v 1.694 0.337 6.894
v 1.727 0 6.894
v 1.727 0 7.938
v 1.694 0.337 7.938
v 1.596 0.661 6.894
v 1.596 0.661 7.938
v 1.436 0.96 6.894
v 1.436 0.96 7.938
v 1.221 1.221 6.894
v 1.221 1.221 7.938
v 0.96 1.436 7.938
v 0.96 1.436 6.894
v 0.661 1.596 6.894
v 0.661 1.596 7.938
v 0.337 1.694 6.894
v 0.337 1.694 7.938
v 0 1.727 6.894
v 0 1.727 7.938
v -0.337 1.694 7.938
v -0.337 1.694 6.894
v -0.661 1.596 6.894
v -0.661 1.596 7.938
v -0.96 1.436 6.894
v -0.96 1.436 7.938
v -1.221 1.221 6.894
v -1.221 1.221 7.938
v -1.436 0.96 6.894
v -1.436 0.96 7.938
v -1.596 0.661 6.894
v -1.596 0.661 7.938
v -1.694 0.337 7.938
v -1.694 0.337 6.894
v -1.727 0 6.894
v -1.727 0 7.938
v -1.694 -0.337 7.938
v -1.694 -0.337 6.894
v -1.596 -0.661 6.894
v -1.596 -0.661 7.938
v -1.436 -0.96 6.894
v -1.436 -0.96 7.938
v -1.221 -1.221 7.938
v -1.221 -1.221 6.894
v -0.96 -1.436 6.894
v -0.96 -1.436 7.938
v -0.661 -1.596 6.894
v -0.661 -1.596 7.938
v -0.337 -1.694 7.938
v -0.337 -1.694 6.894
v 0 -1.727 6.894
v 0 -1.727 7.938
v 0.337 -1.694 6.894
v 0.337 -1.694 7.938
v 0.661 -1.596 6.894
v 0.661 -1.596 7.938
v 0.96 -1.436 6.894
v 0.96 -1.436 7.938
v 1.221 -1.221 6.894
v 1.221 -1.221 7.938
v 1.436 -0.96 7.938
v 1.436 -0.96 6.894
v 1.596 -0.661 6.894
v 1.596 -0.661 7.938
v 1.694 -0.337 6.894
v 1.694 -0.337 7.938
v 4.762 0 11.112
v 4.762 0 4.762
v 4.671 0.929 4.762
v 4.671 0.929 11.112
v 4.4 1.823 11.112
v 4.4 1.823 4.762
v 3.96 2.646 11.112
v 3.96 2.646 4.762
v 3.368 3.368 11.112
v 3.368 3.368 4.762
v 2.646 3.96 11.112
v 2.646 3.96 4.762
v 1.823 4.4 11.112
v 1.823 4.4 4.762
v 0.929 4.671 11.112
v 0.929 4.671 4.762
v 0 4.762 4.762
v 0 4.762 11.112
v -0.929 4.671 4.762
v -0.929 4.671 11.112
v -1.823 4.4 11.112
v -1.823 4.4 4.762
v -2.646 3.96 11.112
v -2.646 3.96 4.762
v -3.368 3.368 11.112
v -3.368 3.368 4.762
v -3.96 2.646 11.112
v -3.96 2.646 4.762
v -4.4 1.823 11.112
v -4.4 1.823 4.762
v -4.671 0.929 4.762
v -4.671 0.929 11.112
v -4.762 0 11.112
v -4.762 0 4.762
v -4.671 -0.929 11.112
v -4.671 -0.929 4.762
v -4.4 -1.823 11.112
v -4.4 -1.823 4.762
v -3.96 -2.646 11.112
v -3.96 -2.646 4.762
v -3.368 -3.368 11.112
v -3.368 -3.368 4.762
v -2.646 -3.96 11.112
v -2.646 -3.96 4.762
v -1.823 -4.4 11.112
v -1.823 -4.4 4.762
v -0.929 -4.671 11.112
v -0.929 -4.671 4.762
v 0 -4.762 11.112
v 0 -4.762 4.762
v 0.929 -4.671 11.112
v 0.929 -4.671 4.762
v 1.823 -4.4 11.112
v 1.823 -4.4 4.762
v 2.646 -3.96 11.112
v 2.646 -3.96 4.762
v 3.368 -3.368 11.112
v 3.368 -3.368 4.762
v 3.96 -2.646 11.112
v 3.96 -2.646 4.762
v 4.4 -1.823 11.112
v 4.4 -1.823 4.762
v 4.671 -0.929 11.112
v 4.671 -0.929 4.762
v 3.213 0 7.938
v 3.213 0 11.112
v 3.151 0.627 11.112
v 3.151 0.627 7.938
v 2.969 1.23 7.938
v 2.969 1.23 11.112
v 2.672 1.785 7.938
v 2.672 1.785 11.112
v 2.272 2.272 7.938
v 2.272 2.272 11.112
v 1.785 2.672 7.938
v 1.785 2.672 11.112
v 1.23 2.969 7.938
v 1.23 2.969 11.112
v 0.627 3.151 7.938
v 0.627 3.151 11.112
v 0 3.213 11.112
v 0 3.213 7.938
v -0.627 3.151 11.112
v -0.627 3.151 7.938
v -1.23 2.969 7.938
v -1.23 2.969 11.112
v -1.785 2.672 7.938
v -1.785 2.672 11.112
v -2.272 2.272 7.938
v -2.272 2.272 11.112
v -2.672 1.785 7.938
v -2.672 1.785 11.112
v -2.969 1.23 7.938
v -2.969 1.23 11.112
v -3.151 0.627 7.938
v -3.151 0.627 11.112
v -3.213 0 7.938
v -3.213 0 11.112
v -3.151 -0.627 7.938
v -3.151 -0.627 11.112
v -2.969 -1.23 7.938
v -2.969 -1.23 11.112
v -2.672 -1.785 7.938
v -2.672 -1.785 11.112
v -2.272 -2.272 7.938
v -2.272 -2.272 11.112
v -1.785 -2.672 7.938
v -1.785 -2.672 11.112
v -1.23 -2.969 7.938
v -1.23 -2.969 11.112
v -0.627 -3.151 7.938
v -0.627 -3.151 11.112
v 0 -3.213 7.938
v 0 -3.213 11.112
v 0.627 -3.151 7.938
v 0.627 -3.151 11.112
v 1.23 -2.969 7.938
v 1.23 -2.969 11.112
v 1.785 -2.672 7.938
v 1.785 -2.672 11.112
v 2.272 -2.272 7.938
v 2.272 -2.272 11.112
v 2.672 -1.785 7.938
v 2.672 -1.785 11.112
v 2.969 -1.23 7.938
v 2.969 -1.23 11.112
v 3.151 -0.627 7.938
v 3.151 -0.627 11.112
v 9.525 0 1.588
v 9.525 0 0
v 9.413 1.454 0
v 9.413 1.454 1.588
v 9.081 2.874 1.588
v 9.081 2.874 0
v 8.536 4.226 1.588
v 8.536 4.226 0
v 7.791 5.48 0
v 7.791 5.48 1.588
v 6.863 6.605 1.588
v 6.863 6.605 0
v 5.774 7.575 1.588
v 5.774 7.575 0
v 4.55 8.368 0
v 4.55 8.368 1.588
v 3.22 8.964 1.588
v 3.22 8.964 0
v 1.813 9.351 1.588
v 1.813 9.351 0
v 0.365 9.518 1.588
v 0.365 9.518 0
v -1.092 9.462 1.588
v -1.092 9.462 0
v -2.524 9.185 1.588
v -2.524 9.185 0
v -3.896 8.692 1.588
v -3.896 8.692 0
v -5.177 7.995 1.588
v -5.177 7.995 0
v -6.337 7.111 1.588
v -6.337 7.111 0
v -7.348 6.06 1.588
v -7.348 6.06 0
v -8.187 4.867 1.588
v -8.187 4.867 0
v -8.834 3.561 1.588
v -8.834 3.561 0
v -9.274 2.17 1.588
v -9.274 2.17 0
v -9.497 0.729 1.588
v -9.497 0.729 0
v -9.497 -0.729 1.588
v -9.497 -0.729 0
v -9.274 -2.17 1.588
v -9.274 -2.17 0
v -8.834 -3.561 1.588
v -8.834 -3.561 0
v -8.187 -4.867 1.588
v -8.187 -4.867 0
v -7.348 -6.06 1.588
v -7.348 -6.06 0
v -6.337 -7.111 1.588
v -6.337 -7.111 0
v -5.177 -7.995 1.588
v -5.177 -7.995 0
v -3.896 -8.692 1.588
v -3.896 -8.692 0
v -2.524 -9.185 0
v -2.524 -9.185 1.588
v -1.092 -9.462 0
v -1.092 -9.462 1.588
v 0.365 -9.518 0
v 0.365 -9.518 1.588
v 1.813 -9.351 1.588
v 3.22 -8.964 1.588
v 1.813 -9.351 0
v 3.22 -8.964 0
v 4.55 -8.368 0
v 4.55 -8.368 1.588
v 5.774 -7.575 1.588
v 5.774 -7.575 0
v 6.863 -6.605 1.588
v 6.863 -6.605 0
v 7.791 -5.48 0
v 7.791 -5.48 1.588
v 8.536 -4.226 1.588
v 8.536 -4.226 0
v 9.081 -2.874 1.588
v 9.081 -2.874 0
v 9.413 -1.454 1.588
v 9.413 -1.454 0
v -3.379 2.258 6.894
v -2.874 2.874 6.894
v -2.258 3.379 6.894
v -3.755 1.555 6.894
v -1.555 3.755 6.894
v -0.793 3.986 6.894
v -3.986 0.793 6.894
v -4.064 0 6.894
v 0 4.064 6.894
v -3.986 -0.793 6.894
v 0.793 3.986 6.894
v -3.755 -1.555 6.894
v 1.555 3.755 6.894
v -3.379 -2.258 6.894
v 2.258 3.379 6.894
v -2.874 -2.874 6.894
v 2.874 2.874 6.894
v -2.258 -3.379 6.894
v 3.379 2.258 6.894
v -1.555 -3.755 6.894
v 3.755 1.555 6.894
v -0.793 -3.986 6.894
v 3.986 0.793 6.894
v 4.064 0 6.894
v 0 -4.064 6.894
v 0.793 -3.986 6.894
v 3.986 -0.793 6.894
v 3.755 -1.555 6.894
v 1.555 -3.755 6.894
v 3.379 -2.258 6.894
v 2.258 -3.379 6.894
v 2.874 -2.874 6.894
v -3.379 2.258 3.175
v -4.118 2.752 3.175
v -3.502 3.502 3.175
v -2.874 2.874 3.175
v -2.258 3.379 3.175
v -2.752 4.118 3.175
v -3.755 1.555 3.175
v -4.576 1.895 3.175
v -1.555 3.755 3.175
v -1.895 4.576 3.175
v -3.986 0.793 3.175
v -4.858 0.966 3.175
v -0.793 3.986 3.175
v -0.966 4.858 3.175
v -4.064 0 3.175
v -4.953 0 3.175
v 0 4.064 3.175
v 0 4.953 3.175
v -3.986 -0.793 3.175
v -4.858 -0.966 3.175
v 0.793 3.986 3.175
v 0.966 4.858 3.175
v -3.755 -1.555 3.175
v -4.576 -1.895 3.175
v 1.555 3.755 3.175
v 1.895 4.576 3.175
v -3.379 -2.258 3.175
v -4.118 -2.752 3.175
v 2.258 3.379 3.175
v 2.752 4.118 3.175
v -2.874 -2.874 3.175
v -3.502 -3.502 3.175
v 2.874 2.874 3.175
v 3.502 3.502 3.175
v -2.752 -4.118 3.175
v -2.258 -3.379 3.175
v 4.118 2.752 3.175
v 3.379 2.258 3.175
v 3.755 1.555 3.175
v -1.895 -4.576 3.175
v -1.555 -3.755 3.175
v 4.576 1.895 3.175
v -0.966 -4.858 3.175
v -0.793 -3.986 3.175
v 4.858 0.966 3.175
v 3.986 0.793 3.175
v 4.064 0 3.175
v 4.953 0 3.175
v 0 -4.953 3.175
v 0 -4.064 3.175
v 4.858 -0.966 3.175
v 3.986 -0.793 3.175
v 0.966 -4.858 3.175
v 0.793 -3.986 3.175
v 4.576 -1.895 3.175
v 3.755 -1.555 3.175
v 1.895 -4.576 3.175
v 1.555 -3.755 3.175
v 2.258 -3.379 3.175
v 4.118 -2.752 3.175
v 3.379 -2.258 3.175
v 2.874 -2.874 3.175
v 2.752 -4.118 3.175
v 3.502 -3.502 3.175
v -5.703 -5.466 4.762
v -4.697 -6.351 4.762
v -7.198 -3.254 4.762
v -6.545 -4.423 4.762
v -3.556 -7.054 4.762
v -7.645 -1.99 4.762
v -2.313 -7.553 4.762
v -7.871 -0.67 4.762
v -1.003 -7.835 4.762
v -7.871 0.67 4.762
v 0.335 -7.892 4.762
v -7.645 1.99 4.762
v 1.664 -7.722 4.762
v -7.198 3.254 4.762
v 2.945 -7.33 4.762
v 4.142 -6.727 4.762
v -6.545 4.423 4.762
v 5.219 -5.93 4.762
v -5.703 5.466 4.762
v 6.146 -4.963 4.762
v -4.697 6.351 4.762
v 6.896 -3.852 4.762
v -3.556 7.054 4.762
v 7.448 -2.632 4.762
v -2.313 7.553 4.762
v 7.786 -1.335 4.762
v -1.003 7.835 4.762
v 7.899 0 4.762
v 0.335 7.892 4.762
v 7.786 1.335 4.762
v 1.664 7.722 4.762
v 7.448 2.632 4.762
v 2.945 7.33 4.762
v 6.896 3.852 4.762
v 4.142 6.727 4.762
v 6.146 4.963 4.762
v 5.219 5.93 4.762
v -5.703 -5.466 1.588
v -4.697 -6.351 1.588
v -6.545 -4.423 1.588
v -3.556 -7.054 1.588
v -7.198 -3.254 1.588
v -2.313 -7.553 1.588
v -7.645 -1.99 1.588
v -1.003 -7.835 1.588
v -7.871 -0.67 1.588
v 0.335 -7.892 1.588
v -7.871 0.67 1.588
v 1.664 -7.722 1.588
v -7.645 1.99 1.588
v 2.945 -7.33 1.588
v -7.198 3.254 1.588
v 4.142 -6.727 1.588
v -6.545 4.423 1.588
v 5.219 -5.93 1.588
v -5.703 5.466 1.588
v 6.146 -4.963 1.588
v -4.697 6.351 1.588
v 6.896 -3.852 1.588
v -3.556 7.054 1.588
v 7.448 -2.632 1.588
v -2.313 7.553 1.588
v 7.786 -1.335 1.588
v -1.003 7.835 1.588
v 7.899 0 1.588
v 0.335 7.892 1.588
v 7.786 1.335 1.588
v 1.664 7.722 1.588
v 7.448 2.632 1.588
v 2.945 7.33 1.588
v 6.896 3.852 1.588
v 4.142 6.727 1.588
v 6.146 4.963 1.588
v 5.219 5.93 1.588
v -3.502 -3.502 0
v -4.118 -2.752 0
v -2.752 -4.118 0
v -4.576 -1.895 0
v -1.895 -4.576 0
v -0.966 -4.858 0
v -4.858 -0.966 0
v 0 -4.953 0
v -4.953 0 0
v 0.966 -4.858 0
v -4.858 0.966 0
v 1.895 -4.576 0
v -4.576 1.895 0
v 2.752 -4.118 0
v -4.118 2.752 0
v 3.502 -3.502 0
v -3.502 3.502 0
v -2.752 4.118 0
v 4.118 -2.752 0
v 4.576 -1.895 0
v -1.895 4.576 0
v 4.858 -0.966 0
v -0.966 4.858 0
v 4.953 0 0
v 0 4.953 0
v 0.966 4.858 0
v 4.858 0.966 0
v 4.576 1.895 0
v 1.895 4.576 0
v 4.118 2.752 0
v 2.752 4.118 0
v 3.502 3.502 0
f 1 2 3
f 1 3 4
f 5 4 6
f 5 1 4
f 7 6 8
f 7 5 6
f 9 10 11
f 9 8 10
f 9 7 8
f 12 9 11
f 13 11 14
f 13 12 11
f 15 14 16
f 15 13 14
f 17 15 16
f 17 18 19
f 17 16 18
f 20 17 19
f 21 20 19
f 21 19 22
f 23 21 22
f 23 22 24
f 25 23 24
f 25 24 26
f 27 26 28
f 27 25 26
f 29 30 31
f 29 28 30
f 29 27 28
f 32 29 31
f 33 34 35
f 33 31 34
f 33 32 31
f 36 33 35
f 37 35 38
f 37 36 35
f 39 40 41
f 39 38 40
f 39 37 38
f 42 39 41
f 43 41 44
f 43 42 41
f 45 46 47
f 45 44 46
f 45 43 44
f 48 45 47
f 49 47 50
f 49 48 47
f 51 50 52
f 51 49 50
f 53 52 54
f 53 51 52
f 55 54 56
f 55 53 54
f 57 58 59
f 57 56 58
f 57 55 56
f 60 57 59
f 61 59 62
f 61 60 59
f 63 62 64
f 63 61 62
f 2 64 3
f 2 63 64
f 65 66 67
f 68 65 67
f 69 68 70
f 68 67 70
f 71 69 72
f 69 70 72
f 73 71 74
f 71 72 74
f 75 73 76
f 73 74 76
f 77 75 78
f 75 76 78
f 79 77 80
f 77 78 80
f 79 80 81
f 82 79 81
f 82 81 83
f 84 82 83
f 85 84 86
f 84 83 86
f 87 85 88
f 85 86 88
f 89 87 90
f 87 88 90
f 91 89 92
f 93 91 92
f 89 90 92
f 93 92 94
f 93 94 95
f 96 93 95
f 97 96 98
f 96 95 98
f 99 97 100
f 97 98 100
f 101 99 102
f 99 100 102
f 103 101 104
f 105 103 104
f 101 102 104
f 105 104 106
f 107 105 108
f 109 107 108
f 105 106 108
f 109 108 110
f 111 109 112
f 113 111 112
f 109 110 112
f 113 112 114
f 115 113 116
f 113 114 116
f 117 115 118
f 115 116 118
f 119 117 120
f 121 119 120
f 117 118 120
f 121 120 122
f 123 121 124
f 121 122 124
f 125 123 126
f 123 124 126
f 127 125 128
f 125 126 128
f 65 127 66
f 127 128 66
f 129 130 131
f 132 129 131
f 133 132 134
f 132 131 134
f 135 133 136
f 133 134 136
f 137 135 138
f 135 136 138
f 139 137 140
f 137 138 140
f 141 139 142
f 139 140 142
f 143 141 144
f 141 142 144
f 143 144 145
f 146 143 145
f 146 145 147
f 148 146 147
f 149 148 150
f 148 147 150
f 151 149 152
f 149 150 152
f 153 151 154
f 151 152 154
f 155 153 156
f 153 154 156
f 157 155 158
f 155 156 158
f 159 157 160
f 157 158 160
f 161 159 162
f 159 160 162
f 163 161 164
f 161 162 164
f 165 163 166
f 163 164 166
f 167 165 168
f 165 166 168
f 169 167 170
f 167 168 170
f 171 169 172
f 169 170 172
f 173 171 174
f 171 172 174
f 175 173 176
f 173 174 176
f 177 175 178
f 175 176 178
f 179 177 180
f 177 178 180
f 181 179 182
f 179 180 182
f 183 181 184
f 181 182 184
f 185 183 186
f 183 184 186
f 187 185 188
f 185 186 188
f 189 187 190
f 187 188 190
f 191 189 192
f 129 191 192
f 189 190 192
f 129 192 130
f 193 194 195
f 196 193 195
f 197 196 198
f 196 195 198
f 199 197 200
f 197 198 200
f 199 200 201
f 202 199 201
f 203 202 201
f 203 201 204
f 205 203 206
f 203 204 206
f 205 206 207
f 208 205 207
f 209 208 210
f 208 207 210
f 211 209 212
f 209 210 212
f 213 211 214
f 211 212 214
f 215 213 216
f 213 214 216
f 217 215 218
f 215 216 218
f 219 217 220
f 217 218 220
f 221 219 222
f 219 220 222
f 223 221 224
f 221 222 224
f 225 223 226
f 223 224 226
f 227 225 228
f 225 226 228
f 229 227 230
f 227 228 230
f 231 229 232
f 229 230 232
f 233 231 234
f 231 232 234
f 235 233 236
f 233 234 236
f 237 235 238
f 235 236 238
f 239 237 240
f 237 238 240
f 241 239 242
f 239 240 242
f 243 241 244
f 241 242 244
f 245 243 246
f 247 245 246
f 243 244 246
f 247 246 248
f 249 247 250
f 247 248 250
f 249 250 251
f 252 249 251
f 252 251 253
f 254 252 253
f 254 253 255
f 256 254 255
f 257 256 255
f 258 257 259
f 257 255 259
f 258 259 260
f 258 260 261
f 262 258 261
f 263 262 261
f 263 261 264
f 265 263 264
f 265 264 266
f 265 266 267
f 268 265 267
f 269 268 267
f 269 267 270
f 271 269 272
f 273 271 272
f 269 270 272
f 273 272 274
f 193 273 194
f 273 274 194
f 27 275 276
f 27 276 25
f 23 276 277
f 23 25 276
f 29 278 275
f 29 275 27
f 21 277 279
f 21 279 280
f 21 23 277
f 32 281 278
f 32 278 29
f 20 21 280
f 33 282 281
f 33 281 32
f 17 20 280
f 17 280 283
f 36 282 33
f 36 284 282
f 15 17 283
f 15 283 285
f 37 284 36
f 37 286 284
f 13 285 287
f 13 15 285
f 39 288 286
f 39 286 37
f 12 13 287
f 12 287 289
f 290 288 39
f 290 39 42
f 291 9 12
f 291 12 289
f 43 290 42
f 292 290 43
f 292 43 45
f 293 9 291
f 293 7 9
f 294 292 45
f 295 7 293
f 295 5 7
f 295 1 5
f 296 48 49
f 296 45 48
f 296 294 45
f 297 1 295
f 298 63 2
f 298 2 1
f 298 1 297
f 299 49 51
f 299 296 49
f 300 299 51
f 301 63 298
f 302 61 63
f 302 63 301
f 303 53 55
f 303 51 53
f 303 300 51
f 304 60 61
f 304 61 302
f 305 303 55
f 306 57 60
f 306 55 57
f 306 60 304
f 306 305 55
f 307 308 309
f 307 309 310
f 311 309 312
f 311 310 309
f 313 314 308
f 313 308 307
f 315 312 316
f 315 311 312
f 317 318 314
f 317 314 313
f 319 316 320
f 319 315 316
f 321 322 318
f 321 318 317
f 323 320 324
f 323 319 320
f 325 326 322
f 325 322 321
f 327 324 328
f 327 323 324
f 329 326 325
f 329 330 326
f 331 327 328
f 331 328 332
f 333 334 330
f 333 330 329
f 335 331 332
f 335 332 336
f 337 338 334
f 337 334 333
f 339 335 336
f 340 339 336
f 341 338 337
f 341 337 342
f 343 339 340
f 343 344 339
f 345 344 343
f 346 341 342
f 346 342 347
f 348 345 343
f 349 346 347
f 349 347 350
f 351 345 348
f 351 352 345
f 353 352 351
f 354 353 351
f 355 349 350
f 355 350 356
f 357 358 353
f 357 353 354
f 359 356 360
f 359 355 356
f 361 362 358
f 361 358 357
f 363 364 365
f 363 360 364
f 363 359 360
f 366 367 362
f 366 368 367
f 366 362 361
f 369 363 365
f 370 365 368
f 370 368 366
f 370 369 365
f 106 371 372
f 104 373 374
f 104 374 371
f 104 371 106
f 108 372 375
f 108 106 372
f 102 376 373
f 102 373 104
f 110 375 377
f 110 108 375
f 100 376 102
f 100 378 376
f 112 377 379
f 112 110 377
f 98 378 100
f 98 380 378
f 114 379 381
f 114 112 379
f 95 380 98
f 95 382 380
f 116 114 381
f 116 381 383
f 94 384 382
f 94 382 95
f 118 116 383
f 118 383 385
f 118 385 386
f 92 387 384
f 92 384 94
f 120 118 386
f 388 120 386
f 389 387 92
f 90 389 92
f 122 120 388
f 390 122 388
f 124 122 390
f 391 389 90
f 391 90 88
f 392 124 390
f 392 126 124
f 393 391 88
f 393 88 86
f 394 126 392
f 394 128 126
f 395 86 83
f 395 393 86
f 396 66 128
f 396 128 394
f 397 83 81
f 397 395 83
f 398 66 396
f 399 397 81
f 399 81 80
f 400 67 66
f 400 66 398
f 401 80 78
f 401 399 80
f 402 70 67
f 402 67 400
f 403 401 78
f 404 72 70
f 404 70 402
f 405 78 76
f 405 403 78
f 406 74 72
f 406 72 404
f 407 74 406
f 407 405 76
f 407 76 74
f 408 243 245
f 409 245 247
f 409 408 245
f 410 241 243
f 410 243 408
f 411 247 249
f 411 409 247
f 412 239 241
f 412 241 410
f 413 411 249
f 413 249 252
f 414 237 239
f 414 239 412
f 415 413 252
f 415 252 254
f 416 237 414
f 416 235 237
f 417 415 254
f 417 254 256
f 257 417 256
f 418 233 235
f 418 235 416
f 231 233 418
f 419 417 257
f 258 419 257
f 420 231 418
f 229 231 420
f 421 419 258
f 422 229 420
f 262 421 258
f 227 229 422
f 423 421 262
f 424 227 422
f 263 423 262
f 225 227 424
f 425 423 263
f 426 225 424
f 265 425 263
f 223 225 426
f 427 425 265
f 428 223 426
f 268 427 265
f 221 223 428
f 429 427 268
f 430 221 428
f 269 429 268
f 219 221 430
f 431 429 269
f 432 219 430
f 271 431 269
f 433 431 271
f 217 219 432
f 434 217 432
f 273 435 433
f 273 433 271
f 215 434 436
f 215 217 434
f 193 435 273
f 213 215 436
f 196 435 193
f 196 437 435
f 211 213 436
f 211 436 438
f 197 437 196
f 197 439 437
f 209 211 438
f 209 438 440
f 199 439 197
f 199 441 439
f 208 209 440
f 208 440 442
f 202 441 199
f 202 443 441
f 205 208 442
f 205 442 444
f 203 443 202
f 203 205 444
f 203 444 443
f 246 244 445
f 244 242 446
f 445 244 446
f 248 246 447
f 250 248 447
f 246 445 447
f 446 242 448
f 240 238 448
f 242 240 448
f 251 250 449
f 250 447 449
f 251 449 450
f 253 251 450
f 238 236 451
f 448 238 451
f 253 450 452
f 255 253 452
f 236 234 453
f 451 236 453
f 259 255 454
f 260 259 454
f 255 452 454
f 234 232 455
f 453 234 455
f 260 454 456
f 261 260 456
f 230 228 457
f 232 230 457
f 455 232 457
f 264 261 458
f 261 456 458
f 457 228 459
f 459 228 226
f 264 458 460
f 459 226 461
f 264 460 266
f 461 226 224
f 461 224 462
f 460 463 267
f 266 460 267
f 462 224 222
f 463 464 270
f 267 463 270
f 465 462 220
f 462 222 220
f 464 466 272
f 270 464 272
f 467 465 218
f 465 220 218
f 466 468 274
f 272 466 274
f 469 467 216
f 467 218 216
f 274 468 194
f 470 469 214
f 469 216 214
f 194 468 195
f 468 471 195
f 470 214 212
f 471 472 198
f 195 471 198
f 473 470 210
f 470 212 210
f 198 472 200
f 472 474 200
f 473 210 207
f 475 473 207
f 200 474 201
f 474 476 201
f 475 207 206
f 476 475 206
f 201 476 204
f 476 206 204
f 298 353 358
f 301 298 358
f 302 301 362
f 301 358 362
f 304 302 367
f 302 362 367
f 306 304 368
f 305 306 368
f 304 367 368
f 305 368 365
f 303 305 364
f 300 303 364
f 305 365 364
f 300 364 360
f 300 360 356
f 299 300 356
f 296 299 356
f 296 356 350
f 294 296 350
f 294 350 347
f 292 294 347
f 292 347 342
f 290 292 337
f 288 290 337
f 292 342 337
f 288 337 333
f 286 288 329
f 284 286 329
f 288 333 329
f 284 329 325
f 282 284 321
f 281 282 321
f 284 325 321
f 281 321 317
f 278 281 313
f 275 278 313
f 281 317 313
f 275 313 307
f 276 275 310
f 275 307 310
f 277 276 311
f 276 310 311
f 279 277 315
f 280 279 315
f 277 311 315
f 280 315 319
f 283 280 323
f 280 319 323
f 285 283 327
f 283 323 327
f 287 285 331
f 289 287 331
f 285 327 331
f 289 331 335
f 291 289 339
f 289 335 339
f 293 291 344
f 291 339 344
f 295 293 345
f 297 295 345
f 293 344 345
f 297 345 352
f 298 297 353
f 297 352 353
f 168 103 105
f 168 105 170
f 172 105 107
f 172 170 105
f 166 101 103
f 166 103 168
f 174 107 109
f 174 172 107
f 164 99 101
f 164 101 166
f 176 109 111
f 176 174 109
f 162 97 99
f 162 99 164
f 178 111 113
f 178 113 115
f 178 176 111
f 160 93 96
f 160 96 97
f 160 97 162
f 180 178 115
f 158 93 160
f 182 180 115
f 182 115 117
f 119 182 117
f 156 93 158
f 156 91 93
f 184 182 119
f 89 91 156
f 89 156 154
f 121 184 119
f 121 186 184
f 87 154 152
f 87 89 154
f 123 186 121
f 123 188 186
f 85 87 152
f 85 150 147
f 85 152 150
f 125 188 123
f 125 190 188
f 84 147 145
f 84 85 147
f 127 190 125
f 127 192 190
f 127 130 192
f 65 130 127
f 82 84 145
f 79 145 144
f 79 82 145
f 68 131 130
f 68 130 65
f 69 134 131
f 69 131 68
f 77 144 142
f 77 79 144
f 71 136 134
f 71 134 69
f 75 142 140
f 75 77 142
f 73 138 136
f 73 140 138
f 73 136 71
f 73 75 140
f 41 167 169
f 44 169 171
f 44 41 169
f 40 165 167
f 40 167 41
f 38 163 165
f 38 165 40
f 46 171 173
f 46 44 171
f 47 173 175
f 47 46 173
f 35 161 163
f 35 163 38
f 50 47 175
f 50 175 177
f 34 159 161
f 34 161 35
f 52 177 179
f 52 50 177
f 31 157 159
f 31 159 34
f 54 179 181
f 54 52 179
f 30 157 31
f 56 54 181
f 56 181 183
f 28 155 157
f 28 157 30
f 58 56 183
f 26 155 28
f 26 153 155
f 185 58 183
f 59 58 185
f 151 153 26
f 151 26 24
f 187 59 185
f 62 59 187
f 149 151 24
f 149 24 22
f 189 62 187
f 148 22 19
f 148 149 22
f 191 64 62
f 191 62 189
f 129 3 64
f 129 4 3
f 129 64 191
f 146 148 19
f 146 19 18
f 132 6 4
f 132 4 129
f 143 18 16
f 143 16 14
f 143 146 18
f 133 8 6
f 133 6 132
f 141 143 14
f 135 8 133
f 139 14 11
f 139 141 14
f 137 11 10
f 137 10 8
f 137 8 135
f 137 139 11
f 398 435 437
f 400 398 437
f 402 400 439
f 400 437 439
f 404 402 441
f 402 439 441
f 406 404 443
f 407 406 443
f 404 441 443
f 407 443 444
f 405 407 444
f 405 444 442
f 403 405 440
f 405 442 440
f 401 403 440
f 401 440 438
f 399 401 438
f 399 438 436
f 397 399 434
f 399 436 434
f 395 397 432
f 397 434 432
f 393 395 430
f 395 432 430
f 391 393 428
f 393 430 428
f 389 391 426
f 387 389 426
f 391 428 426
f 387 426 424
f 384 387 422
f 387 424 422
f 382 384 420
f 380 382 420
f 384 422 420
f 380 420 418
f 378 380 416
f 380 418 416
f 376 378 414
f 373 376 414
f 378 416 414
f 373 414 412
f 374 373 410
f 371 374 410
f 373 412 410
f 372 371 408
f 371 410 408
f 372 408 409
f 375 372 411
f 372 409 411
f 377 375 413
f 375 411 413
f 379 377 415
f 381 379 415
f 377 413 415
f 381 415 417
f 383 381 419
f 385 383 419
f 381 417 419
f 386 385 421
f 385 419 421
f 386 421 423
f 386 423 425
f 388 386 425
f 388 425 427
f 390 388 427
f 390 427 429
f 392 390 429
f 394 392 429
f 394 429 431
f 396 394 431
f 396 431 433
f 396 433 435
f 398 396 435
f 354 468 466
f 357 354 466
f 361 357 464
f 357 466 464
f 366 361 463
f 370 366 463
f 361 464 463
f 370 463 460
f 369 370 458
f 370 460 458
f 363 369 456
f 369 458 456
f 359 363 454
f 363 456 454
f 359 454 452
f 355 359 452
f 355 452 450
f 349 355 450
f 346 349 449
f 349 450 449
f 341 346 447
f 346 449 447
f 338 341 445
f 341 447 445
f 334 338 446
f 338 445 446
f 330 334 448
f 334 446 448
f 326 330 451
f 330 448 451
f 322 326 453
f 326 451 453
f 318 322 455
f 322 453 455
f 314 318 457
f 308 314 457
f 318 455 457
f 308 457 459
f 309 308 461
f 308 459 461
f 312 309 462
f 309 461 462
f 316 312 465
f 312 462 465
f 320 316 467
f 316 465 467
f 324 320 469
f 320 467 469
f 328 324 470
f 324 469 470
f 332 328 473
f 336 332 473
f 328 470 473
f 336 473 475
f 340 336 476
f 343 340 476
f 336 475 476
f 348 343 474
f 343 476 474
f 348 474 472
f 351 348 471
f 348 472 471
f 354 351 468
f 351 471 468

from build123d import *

# Parameters (mm, degrees)
F0_R      = 9.525
F1_DEPTH  = 1.5875
F2_R      = 7.8994
F3_DEPTH  = 3.175
F4_R      = 4.953
F5_DEPTH  = 3.175
F6_R      = 1.7272
F7_DEPTH  = 1.5885
F8_R      = 4.7625
F8_R_2    = 1.7272
F9_DEPTH  = 6.35
F10_R     = 3.2131
F11_DEPTH = 3.175
F12_R     = 4.064
F13_DEPTH = 3.71856


with BuildPart() as f1:
    # F0 (on Top) → F1 (new body)
    with BuildSketch(Plane.XY):
        Circle(F0_R)
    extrude(amount=F1_DEPTH)

    # F2 (on face) → F3 (join)
    with BuildSketch(Plane.XY.offset(1.5875)):
        Circle(F2_R)
    extrude(amount=F3_DEPTH)

    # F4 (on face) → F5 (cut)
    with BuildSketch(Plane(origin=(0, 0, 0), x_dir=(1, 0, 0), z_dir=(0, 0, -1))):
        Circle(F4_R)
    extrude(amount=-F5_DEPTH, mode=Mode.SUBTRACT)

    # F6 (on face) → F7 (cut, through all)
    with BuildSketch(Plane(origin=(0, 0, 3.175), x_dir=(1, 0, 0), z_dir=(0, 0, -1))):
        Circle(F6_R)
    extrude(amount=-F7_DEPTH, mode=Mode.SUBTRACT)

    # F8 (on face) → F9 (join)
    with BuildSketch(Plane.XY.offset(4.7625)):
        Circle(F8_R)
        Circle(F8_R_2, mode=Mode.SUBTRACT)
    extrude(amount=F9_DEPTH)

    # F10 (on face) → F11 (cut)
    with BuildSketch(Plane.XY.offset(11.1125)):
        Circle(F10_R)
    extrude(amount=-F11_DEPTH, mode=Mode.SUBTRACT)

    # F12 (on face) → F13 (cut)
    with BuildSketch(Plane(origin=(0, 0, 3.175), x_dir=(1, 0, 0), z_dir=(0, 0, -1))):
        Circle(F12_R)
    extrude(amount=-F13_DEPTH, mode=Mode.SUBTRACT)


solid = f1.part
